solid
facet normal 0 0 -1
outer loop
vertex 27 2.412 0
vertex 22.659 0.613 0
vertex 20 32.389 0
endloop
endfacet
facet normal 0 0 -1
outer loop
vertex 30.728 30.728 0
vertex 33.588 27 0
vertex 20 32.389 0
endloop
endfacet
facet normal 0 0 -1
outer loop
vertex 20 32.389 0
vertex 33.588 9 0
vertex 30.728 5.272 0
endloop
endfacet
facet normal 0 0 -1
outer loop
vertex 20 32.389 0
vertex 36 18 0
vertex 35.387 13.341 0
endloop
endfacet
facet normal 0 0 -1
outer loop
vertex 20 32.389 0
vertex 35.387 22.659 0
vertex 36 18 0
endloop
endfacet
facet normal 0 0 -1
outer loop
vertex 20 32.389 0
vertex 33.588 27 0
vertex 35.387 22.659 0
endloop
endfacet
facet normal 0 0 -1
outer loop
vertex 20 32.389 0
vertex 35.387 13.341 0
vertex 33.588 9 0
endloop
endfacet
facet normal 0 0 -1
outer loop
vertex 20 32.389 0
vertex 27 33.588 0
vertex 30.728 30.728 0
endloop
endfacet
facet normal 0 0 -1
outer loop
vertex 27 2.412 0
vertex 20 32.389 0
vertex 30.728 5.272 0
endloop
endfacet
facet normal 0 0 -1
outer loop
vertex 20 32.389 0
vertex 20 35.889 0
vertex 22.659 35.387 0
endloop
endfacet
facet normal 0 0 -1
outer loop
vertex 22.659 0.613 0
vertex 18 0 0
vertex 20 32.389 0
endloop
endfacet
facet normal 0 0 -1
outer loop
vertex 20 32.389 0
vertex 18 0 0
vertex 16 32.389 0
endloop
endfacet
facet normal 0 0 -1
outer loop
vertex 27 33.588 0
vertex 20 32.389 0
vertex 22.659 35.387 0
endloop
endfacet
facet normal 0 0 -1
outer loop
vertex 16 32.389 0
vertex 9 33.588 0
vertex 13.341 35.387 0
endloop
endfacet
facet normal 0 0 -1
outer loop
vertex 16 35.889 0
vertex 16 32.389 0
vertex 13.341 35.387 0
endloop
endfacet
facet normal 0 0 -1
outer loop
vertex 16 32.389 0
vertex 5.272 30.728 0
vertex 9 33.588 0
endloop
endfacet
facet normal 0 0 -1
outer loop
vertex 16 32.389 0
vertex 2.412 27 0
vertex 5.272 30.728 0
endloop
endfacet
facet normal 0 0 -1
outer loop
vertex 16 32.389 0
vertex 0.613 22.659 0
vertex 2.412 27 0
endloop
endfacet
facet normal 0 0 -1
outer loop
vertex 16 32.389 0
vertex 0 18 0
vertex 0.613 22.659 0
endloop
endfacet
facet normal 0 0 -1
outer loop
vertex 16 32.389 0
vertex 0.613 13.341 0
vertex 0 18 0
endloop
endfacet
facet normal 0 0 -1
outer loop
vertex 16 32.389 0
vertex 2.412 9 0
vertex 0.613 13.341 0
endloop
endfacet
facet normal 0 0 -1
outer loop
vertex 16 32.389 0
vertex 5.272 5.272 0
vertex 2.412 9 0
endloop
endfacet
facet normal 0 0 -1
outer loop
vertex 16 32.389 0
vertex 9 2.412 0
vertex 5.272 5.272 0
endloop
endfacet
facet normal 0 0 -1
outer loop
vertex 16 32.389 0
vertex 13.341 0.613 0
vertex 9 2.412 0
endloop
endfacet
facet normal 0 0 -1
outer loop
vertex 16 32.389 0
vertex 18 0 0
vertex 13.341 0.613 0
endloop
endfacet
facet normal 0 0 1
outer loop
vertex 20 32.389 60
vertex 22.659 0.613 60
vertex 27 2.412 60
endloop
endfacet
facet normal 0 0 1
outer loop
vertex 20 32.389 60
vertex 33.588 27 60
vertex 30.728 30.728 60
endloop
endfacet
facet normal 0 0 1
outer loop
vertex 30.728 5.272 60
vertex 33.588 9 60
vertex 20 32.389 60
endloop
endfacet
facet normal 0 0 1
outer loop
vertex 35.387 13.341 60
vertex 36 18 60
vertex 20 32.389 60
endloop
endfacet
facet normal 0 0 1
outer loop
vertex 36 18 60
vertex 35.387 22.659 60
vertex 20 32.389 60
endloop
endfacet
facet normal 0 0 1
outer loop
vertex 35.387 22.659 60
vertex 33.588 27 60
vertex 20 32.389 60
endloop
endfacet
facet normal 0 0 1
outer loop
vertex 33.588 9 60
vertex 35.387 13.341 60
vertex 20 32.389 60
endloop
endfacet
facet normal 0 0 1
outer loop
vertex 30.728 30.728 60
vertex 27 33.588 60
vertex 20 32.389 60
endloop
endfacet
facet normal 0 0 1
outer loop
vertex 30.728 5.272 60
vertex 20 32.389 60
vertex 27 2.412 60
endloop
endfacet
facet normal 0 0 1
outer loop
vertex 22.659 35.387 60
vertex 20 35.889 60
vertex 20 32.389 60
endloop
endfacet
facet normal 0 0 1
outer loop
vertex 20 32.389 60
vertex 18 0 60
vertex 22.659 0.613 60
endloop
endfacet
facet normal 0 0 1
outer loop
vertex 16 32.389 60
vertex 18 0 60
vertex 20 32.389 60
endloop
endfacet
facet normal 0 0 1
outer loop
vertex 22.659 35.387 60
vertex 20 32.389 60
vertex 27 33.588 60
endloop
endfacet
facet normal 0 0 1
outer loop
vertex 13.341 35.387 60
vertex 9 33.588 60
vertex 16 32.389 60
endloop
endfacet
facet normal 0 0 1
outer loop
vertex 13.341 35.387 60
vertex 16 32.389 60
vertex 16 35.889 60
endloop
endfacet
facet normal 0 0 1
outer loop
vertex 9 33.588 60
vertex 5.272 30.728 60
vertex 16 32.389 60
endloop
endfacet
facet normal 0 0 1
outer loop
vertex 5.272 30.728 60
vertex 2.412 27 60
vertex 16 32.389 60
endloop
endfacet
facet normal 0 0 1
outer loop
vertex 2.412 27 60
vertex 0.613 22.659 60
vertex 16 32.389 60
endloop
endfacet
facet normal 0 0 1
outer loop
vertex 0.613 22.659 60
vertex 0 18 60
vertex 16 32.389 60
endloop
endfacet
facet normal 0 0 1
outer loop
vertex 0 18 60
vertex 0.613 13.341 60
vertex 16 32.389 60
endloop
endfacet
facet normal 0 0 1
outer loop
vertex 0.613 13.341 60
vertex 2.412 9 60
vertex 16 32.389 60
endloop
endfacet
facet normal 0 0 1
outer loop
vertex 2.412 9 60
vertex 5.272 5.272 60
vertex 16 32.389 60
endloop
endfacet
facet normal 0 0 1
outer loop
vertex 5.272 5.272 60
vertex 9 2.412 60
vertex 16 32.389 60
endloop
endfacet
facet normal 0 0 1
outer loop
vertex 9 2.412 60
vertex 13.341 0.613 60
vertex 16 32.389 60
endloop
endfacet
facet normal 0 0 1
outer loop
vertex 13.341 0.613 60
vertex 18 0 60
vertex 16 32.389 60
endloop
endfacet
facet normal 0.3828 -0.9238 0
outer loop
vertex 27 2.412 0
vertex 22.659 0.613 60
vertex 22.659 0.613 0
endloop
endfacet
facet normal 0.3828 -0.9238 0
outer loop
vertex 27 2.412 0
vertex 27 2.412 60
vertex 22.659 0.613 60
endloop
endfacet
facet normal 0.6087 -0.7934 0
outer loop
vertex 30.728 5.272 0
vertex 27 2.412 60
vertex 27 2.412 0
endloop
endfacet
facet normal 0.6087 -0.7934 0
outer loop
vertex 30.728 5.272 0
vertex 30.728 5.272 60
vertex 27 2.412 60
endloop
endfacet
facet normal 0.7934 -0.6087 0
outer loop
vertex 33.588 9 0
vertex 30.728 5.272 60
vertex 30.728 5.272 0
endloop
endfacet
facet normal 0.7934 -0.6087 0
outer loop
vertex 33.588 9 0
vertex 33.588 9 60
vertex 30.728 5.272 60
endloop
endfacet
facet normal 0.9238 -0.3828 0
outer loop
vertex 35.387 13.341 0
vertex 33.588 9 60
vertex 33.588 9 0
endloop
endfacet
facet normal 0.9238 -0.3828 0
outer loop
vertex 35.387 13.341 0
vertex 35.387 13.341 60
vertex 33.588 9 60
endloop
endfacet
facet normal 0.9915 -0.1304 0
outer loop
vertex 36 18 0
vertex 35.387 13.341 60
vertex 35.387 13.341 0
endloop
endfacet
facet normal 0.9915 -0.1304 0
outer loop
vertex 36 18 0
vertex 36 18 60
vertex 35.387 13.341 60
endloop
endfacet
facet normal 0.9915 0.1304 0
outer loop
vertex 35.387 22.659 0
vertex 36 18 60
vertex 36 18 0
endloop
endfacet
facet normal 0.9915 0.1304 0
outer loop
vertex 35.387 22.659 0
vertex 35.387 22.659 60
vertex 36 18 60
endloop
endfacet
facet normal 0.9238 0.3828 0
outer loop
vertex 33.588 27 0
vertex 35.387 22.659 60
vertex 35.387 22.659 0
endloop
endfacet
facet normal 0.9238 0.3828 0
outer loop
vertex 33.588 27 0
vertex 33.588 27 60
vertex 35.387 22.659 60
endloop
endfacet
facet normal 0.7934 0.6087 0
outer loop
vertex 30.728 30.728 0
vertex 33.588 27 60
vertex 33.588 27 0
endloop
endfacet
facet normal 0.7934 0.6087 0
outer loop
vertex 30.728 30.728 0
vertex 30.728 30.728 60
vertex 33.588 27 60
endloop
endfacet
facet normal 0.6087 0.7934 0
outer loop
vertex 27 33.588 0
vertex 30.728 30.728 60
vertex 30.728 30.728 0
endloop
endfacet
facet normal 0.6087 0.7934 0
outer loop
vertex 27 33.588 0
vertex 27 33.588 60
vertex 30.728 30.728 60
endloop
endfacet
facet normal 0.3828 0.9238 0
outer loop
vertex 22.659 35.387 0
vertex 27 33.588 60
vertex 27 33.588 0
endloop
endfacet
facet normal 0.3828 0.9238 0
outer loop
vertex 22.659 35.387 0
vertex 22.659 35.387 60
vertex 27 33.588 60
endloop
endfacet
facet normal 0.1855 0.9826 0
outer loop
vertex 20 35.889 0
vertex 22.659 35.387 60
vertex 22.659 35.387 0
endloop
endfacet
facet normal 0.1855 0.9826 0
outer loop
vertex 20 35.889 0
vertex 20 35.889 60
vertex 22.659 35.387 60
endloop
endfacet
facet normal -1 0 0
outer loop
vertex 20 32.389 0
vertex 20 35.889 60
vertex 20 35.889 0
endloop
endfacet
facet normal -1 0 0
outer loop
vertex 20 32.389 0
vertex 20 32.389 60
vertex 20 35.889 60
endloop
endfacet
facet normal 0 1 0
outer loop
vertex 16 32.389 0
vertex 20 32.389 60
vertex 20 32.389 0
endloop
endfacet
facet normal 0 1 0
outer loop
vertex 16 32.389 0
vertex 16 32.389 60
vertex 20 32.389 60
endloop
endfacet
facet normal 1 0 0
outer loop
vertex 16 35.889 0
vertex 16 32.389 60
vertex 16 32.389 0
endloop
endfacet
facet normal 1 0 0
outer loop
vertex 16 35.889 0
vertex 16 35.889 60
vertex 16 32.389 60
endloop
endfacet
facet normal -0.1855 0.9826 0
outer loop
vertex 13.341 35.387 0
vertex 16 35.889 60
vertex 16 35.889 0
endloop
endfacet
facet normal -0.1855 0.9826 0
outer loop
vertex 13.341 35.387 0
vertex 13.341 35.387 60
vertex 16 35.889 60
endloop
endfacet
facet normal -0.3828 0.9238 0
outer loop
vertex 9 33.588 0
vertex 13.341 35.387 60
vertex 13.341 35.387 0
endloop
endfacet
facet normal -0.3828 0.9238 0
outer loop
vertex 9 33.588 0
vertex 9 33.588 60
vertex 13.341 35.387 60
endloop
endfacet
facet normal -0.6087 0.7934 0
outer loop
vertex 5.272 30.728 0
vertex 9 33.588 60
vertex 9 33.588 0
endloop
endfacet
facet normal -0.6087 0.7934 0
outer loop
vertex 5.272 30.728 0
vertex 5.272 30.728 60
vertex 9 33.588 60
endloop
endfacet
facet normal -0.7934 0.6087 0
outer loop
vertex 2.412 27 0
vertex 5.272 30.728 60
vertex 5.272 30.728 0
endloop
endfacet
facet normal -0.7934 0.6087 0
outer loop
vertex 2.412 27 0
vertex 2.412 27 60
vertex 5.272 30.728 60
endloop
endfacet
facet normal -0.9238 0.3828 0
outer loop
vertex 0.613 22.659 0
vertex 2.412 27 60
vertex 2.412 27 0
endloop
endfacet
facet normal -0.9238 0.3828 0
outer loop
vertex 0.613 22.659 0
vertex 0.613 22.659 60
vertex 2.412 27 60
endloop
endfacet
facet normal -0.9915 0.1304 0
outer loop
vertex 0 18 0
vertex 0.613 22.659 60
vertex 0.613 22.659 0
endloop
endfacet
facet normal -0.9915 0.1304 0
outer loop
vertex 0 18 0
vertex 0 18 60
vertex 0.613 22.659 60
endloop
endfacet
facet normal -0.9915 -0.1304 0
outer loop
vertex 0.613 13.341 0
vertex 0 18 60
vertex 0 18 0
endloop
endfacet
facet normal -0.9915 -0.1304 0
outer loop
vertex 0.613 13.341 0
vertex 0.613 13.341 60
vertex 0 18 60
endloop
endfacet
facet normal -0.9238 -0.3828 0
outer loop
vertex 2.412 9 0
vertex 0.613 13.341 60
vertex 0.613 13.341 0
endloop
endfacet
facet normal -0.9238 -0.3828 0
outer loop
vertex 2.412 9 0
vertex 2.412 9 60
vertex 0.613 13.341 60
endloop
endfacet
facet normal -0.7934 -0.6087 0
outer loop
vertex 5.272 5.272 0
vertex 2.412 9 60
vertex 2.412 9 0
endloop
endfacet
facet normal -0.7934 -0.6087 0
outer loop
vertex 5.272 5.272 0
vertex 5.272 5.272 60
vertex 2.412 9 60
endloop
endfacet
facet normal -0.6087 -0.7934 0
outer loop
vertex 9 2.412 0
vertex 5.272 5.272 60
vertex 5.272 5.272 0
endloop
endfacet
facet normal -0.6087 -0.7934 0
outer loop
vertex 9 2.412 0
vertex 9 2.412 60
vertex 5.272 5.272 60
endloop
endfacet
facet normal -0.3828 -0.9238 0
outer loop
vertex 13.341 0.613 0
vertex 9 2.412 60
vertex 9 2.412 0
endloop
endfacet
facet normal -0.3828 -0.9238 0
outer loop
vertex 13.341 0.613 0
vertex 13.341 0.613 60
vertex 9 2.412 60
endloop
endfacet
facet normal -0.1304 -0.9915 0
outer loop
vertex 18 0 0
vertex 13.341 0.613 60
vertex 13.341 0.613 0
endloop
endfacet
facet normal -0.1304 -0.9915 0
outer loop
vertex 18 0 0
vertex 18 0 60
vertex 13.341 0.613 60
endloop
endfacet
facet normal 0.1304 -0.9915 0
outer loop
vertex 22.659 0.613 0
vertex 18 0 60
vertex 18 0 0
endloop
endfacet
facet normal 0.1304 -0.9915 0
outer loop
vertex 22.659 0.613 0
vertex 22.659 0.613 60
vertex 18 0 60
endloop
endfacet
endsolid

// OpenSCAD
$fn = 32;

// ----------------------------------------------------------------------
// Keyway shaft: d36 shaft, key 4 x 3.5 mm
// ----------------------------------------------------------------------

// --- parameters (mm) ---
shaft_r = 18;             // shaft radius
key_w = 4;                // keyway width
key_d = 3.5;              // keyway depth below the surface line
plate_t = 60;             // shaft length, Z (extrusion height)

shaft_d = 2 * shaft_r;  // shaft diameter
circle_step = 15;  // polygon sampling step, degrees

profile = [[13.341, 35.387], [9, 33.588], [5.272, 30.728], [2.412, 27], [0.613, 22.659], [0, 18], [0.613, 13.341], [2.412, 9], [5.272, 5.272], [9, 2.412], [13.341, 0.613], [18, 0], [22.659, 0.613], [27, 2.412], [30.728, 5.272], [33.588, 9], [35.387, 13.341], [36, 18], [35.387, 22.659], [33.588, 27], [30.728, 30.728], [27, 33.588], [22.659, 35.387], [20, 35.889], [20, 32.389], [16, 32.389], [16, 35.889]];  // primary outline, 27 points, counter clockwise

// --- the one profile operation ---
linear_extrude(height = plate_t) polygon(points = profile);
